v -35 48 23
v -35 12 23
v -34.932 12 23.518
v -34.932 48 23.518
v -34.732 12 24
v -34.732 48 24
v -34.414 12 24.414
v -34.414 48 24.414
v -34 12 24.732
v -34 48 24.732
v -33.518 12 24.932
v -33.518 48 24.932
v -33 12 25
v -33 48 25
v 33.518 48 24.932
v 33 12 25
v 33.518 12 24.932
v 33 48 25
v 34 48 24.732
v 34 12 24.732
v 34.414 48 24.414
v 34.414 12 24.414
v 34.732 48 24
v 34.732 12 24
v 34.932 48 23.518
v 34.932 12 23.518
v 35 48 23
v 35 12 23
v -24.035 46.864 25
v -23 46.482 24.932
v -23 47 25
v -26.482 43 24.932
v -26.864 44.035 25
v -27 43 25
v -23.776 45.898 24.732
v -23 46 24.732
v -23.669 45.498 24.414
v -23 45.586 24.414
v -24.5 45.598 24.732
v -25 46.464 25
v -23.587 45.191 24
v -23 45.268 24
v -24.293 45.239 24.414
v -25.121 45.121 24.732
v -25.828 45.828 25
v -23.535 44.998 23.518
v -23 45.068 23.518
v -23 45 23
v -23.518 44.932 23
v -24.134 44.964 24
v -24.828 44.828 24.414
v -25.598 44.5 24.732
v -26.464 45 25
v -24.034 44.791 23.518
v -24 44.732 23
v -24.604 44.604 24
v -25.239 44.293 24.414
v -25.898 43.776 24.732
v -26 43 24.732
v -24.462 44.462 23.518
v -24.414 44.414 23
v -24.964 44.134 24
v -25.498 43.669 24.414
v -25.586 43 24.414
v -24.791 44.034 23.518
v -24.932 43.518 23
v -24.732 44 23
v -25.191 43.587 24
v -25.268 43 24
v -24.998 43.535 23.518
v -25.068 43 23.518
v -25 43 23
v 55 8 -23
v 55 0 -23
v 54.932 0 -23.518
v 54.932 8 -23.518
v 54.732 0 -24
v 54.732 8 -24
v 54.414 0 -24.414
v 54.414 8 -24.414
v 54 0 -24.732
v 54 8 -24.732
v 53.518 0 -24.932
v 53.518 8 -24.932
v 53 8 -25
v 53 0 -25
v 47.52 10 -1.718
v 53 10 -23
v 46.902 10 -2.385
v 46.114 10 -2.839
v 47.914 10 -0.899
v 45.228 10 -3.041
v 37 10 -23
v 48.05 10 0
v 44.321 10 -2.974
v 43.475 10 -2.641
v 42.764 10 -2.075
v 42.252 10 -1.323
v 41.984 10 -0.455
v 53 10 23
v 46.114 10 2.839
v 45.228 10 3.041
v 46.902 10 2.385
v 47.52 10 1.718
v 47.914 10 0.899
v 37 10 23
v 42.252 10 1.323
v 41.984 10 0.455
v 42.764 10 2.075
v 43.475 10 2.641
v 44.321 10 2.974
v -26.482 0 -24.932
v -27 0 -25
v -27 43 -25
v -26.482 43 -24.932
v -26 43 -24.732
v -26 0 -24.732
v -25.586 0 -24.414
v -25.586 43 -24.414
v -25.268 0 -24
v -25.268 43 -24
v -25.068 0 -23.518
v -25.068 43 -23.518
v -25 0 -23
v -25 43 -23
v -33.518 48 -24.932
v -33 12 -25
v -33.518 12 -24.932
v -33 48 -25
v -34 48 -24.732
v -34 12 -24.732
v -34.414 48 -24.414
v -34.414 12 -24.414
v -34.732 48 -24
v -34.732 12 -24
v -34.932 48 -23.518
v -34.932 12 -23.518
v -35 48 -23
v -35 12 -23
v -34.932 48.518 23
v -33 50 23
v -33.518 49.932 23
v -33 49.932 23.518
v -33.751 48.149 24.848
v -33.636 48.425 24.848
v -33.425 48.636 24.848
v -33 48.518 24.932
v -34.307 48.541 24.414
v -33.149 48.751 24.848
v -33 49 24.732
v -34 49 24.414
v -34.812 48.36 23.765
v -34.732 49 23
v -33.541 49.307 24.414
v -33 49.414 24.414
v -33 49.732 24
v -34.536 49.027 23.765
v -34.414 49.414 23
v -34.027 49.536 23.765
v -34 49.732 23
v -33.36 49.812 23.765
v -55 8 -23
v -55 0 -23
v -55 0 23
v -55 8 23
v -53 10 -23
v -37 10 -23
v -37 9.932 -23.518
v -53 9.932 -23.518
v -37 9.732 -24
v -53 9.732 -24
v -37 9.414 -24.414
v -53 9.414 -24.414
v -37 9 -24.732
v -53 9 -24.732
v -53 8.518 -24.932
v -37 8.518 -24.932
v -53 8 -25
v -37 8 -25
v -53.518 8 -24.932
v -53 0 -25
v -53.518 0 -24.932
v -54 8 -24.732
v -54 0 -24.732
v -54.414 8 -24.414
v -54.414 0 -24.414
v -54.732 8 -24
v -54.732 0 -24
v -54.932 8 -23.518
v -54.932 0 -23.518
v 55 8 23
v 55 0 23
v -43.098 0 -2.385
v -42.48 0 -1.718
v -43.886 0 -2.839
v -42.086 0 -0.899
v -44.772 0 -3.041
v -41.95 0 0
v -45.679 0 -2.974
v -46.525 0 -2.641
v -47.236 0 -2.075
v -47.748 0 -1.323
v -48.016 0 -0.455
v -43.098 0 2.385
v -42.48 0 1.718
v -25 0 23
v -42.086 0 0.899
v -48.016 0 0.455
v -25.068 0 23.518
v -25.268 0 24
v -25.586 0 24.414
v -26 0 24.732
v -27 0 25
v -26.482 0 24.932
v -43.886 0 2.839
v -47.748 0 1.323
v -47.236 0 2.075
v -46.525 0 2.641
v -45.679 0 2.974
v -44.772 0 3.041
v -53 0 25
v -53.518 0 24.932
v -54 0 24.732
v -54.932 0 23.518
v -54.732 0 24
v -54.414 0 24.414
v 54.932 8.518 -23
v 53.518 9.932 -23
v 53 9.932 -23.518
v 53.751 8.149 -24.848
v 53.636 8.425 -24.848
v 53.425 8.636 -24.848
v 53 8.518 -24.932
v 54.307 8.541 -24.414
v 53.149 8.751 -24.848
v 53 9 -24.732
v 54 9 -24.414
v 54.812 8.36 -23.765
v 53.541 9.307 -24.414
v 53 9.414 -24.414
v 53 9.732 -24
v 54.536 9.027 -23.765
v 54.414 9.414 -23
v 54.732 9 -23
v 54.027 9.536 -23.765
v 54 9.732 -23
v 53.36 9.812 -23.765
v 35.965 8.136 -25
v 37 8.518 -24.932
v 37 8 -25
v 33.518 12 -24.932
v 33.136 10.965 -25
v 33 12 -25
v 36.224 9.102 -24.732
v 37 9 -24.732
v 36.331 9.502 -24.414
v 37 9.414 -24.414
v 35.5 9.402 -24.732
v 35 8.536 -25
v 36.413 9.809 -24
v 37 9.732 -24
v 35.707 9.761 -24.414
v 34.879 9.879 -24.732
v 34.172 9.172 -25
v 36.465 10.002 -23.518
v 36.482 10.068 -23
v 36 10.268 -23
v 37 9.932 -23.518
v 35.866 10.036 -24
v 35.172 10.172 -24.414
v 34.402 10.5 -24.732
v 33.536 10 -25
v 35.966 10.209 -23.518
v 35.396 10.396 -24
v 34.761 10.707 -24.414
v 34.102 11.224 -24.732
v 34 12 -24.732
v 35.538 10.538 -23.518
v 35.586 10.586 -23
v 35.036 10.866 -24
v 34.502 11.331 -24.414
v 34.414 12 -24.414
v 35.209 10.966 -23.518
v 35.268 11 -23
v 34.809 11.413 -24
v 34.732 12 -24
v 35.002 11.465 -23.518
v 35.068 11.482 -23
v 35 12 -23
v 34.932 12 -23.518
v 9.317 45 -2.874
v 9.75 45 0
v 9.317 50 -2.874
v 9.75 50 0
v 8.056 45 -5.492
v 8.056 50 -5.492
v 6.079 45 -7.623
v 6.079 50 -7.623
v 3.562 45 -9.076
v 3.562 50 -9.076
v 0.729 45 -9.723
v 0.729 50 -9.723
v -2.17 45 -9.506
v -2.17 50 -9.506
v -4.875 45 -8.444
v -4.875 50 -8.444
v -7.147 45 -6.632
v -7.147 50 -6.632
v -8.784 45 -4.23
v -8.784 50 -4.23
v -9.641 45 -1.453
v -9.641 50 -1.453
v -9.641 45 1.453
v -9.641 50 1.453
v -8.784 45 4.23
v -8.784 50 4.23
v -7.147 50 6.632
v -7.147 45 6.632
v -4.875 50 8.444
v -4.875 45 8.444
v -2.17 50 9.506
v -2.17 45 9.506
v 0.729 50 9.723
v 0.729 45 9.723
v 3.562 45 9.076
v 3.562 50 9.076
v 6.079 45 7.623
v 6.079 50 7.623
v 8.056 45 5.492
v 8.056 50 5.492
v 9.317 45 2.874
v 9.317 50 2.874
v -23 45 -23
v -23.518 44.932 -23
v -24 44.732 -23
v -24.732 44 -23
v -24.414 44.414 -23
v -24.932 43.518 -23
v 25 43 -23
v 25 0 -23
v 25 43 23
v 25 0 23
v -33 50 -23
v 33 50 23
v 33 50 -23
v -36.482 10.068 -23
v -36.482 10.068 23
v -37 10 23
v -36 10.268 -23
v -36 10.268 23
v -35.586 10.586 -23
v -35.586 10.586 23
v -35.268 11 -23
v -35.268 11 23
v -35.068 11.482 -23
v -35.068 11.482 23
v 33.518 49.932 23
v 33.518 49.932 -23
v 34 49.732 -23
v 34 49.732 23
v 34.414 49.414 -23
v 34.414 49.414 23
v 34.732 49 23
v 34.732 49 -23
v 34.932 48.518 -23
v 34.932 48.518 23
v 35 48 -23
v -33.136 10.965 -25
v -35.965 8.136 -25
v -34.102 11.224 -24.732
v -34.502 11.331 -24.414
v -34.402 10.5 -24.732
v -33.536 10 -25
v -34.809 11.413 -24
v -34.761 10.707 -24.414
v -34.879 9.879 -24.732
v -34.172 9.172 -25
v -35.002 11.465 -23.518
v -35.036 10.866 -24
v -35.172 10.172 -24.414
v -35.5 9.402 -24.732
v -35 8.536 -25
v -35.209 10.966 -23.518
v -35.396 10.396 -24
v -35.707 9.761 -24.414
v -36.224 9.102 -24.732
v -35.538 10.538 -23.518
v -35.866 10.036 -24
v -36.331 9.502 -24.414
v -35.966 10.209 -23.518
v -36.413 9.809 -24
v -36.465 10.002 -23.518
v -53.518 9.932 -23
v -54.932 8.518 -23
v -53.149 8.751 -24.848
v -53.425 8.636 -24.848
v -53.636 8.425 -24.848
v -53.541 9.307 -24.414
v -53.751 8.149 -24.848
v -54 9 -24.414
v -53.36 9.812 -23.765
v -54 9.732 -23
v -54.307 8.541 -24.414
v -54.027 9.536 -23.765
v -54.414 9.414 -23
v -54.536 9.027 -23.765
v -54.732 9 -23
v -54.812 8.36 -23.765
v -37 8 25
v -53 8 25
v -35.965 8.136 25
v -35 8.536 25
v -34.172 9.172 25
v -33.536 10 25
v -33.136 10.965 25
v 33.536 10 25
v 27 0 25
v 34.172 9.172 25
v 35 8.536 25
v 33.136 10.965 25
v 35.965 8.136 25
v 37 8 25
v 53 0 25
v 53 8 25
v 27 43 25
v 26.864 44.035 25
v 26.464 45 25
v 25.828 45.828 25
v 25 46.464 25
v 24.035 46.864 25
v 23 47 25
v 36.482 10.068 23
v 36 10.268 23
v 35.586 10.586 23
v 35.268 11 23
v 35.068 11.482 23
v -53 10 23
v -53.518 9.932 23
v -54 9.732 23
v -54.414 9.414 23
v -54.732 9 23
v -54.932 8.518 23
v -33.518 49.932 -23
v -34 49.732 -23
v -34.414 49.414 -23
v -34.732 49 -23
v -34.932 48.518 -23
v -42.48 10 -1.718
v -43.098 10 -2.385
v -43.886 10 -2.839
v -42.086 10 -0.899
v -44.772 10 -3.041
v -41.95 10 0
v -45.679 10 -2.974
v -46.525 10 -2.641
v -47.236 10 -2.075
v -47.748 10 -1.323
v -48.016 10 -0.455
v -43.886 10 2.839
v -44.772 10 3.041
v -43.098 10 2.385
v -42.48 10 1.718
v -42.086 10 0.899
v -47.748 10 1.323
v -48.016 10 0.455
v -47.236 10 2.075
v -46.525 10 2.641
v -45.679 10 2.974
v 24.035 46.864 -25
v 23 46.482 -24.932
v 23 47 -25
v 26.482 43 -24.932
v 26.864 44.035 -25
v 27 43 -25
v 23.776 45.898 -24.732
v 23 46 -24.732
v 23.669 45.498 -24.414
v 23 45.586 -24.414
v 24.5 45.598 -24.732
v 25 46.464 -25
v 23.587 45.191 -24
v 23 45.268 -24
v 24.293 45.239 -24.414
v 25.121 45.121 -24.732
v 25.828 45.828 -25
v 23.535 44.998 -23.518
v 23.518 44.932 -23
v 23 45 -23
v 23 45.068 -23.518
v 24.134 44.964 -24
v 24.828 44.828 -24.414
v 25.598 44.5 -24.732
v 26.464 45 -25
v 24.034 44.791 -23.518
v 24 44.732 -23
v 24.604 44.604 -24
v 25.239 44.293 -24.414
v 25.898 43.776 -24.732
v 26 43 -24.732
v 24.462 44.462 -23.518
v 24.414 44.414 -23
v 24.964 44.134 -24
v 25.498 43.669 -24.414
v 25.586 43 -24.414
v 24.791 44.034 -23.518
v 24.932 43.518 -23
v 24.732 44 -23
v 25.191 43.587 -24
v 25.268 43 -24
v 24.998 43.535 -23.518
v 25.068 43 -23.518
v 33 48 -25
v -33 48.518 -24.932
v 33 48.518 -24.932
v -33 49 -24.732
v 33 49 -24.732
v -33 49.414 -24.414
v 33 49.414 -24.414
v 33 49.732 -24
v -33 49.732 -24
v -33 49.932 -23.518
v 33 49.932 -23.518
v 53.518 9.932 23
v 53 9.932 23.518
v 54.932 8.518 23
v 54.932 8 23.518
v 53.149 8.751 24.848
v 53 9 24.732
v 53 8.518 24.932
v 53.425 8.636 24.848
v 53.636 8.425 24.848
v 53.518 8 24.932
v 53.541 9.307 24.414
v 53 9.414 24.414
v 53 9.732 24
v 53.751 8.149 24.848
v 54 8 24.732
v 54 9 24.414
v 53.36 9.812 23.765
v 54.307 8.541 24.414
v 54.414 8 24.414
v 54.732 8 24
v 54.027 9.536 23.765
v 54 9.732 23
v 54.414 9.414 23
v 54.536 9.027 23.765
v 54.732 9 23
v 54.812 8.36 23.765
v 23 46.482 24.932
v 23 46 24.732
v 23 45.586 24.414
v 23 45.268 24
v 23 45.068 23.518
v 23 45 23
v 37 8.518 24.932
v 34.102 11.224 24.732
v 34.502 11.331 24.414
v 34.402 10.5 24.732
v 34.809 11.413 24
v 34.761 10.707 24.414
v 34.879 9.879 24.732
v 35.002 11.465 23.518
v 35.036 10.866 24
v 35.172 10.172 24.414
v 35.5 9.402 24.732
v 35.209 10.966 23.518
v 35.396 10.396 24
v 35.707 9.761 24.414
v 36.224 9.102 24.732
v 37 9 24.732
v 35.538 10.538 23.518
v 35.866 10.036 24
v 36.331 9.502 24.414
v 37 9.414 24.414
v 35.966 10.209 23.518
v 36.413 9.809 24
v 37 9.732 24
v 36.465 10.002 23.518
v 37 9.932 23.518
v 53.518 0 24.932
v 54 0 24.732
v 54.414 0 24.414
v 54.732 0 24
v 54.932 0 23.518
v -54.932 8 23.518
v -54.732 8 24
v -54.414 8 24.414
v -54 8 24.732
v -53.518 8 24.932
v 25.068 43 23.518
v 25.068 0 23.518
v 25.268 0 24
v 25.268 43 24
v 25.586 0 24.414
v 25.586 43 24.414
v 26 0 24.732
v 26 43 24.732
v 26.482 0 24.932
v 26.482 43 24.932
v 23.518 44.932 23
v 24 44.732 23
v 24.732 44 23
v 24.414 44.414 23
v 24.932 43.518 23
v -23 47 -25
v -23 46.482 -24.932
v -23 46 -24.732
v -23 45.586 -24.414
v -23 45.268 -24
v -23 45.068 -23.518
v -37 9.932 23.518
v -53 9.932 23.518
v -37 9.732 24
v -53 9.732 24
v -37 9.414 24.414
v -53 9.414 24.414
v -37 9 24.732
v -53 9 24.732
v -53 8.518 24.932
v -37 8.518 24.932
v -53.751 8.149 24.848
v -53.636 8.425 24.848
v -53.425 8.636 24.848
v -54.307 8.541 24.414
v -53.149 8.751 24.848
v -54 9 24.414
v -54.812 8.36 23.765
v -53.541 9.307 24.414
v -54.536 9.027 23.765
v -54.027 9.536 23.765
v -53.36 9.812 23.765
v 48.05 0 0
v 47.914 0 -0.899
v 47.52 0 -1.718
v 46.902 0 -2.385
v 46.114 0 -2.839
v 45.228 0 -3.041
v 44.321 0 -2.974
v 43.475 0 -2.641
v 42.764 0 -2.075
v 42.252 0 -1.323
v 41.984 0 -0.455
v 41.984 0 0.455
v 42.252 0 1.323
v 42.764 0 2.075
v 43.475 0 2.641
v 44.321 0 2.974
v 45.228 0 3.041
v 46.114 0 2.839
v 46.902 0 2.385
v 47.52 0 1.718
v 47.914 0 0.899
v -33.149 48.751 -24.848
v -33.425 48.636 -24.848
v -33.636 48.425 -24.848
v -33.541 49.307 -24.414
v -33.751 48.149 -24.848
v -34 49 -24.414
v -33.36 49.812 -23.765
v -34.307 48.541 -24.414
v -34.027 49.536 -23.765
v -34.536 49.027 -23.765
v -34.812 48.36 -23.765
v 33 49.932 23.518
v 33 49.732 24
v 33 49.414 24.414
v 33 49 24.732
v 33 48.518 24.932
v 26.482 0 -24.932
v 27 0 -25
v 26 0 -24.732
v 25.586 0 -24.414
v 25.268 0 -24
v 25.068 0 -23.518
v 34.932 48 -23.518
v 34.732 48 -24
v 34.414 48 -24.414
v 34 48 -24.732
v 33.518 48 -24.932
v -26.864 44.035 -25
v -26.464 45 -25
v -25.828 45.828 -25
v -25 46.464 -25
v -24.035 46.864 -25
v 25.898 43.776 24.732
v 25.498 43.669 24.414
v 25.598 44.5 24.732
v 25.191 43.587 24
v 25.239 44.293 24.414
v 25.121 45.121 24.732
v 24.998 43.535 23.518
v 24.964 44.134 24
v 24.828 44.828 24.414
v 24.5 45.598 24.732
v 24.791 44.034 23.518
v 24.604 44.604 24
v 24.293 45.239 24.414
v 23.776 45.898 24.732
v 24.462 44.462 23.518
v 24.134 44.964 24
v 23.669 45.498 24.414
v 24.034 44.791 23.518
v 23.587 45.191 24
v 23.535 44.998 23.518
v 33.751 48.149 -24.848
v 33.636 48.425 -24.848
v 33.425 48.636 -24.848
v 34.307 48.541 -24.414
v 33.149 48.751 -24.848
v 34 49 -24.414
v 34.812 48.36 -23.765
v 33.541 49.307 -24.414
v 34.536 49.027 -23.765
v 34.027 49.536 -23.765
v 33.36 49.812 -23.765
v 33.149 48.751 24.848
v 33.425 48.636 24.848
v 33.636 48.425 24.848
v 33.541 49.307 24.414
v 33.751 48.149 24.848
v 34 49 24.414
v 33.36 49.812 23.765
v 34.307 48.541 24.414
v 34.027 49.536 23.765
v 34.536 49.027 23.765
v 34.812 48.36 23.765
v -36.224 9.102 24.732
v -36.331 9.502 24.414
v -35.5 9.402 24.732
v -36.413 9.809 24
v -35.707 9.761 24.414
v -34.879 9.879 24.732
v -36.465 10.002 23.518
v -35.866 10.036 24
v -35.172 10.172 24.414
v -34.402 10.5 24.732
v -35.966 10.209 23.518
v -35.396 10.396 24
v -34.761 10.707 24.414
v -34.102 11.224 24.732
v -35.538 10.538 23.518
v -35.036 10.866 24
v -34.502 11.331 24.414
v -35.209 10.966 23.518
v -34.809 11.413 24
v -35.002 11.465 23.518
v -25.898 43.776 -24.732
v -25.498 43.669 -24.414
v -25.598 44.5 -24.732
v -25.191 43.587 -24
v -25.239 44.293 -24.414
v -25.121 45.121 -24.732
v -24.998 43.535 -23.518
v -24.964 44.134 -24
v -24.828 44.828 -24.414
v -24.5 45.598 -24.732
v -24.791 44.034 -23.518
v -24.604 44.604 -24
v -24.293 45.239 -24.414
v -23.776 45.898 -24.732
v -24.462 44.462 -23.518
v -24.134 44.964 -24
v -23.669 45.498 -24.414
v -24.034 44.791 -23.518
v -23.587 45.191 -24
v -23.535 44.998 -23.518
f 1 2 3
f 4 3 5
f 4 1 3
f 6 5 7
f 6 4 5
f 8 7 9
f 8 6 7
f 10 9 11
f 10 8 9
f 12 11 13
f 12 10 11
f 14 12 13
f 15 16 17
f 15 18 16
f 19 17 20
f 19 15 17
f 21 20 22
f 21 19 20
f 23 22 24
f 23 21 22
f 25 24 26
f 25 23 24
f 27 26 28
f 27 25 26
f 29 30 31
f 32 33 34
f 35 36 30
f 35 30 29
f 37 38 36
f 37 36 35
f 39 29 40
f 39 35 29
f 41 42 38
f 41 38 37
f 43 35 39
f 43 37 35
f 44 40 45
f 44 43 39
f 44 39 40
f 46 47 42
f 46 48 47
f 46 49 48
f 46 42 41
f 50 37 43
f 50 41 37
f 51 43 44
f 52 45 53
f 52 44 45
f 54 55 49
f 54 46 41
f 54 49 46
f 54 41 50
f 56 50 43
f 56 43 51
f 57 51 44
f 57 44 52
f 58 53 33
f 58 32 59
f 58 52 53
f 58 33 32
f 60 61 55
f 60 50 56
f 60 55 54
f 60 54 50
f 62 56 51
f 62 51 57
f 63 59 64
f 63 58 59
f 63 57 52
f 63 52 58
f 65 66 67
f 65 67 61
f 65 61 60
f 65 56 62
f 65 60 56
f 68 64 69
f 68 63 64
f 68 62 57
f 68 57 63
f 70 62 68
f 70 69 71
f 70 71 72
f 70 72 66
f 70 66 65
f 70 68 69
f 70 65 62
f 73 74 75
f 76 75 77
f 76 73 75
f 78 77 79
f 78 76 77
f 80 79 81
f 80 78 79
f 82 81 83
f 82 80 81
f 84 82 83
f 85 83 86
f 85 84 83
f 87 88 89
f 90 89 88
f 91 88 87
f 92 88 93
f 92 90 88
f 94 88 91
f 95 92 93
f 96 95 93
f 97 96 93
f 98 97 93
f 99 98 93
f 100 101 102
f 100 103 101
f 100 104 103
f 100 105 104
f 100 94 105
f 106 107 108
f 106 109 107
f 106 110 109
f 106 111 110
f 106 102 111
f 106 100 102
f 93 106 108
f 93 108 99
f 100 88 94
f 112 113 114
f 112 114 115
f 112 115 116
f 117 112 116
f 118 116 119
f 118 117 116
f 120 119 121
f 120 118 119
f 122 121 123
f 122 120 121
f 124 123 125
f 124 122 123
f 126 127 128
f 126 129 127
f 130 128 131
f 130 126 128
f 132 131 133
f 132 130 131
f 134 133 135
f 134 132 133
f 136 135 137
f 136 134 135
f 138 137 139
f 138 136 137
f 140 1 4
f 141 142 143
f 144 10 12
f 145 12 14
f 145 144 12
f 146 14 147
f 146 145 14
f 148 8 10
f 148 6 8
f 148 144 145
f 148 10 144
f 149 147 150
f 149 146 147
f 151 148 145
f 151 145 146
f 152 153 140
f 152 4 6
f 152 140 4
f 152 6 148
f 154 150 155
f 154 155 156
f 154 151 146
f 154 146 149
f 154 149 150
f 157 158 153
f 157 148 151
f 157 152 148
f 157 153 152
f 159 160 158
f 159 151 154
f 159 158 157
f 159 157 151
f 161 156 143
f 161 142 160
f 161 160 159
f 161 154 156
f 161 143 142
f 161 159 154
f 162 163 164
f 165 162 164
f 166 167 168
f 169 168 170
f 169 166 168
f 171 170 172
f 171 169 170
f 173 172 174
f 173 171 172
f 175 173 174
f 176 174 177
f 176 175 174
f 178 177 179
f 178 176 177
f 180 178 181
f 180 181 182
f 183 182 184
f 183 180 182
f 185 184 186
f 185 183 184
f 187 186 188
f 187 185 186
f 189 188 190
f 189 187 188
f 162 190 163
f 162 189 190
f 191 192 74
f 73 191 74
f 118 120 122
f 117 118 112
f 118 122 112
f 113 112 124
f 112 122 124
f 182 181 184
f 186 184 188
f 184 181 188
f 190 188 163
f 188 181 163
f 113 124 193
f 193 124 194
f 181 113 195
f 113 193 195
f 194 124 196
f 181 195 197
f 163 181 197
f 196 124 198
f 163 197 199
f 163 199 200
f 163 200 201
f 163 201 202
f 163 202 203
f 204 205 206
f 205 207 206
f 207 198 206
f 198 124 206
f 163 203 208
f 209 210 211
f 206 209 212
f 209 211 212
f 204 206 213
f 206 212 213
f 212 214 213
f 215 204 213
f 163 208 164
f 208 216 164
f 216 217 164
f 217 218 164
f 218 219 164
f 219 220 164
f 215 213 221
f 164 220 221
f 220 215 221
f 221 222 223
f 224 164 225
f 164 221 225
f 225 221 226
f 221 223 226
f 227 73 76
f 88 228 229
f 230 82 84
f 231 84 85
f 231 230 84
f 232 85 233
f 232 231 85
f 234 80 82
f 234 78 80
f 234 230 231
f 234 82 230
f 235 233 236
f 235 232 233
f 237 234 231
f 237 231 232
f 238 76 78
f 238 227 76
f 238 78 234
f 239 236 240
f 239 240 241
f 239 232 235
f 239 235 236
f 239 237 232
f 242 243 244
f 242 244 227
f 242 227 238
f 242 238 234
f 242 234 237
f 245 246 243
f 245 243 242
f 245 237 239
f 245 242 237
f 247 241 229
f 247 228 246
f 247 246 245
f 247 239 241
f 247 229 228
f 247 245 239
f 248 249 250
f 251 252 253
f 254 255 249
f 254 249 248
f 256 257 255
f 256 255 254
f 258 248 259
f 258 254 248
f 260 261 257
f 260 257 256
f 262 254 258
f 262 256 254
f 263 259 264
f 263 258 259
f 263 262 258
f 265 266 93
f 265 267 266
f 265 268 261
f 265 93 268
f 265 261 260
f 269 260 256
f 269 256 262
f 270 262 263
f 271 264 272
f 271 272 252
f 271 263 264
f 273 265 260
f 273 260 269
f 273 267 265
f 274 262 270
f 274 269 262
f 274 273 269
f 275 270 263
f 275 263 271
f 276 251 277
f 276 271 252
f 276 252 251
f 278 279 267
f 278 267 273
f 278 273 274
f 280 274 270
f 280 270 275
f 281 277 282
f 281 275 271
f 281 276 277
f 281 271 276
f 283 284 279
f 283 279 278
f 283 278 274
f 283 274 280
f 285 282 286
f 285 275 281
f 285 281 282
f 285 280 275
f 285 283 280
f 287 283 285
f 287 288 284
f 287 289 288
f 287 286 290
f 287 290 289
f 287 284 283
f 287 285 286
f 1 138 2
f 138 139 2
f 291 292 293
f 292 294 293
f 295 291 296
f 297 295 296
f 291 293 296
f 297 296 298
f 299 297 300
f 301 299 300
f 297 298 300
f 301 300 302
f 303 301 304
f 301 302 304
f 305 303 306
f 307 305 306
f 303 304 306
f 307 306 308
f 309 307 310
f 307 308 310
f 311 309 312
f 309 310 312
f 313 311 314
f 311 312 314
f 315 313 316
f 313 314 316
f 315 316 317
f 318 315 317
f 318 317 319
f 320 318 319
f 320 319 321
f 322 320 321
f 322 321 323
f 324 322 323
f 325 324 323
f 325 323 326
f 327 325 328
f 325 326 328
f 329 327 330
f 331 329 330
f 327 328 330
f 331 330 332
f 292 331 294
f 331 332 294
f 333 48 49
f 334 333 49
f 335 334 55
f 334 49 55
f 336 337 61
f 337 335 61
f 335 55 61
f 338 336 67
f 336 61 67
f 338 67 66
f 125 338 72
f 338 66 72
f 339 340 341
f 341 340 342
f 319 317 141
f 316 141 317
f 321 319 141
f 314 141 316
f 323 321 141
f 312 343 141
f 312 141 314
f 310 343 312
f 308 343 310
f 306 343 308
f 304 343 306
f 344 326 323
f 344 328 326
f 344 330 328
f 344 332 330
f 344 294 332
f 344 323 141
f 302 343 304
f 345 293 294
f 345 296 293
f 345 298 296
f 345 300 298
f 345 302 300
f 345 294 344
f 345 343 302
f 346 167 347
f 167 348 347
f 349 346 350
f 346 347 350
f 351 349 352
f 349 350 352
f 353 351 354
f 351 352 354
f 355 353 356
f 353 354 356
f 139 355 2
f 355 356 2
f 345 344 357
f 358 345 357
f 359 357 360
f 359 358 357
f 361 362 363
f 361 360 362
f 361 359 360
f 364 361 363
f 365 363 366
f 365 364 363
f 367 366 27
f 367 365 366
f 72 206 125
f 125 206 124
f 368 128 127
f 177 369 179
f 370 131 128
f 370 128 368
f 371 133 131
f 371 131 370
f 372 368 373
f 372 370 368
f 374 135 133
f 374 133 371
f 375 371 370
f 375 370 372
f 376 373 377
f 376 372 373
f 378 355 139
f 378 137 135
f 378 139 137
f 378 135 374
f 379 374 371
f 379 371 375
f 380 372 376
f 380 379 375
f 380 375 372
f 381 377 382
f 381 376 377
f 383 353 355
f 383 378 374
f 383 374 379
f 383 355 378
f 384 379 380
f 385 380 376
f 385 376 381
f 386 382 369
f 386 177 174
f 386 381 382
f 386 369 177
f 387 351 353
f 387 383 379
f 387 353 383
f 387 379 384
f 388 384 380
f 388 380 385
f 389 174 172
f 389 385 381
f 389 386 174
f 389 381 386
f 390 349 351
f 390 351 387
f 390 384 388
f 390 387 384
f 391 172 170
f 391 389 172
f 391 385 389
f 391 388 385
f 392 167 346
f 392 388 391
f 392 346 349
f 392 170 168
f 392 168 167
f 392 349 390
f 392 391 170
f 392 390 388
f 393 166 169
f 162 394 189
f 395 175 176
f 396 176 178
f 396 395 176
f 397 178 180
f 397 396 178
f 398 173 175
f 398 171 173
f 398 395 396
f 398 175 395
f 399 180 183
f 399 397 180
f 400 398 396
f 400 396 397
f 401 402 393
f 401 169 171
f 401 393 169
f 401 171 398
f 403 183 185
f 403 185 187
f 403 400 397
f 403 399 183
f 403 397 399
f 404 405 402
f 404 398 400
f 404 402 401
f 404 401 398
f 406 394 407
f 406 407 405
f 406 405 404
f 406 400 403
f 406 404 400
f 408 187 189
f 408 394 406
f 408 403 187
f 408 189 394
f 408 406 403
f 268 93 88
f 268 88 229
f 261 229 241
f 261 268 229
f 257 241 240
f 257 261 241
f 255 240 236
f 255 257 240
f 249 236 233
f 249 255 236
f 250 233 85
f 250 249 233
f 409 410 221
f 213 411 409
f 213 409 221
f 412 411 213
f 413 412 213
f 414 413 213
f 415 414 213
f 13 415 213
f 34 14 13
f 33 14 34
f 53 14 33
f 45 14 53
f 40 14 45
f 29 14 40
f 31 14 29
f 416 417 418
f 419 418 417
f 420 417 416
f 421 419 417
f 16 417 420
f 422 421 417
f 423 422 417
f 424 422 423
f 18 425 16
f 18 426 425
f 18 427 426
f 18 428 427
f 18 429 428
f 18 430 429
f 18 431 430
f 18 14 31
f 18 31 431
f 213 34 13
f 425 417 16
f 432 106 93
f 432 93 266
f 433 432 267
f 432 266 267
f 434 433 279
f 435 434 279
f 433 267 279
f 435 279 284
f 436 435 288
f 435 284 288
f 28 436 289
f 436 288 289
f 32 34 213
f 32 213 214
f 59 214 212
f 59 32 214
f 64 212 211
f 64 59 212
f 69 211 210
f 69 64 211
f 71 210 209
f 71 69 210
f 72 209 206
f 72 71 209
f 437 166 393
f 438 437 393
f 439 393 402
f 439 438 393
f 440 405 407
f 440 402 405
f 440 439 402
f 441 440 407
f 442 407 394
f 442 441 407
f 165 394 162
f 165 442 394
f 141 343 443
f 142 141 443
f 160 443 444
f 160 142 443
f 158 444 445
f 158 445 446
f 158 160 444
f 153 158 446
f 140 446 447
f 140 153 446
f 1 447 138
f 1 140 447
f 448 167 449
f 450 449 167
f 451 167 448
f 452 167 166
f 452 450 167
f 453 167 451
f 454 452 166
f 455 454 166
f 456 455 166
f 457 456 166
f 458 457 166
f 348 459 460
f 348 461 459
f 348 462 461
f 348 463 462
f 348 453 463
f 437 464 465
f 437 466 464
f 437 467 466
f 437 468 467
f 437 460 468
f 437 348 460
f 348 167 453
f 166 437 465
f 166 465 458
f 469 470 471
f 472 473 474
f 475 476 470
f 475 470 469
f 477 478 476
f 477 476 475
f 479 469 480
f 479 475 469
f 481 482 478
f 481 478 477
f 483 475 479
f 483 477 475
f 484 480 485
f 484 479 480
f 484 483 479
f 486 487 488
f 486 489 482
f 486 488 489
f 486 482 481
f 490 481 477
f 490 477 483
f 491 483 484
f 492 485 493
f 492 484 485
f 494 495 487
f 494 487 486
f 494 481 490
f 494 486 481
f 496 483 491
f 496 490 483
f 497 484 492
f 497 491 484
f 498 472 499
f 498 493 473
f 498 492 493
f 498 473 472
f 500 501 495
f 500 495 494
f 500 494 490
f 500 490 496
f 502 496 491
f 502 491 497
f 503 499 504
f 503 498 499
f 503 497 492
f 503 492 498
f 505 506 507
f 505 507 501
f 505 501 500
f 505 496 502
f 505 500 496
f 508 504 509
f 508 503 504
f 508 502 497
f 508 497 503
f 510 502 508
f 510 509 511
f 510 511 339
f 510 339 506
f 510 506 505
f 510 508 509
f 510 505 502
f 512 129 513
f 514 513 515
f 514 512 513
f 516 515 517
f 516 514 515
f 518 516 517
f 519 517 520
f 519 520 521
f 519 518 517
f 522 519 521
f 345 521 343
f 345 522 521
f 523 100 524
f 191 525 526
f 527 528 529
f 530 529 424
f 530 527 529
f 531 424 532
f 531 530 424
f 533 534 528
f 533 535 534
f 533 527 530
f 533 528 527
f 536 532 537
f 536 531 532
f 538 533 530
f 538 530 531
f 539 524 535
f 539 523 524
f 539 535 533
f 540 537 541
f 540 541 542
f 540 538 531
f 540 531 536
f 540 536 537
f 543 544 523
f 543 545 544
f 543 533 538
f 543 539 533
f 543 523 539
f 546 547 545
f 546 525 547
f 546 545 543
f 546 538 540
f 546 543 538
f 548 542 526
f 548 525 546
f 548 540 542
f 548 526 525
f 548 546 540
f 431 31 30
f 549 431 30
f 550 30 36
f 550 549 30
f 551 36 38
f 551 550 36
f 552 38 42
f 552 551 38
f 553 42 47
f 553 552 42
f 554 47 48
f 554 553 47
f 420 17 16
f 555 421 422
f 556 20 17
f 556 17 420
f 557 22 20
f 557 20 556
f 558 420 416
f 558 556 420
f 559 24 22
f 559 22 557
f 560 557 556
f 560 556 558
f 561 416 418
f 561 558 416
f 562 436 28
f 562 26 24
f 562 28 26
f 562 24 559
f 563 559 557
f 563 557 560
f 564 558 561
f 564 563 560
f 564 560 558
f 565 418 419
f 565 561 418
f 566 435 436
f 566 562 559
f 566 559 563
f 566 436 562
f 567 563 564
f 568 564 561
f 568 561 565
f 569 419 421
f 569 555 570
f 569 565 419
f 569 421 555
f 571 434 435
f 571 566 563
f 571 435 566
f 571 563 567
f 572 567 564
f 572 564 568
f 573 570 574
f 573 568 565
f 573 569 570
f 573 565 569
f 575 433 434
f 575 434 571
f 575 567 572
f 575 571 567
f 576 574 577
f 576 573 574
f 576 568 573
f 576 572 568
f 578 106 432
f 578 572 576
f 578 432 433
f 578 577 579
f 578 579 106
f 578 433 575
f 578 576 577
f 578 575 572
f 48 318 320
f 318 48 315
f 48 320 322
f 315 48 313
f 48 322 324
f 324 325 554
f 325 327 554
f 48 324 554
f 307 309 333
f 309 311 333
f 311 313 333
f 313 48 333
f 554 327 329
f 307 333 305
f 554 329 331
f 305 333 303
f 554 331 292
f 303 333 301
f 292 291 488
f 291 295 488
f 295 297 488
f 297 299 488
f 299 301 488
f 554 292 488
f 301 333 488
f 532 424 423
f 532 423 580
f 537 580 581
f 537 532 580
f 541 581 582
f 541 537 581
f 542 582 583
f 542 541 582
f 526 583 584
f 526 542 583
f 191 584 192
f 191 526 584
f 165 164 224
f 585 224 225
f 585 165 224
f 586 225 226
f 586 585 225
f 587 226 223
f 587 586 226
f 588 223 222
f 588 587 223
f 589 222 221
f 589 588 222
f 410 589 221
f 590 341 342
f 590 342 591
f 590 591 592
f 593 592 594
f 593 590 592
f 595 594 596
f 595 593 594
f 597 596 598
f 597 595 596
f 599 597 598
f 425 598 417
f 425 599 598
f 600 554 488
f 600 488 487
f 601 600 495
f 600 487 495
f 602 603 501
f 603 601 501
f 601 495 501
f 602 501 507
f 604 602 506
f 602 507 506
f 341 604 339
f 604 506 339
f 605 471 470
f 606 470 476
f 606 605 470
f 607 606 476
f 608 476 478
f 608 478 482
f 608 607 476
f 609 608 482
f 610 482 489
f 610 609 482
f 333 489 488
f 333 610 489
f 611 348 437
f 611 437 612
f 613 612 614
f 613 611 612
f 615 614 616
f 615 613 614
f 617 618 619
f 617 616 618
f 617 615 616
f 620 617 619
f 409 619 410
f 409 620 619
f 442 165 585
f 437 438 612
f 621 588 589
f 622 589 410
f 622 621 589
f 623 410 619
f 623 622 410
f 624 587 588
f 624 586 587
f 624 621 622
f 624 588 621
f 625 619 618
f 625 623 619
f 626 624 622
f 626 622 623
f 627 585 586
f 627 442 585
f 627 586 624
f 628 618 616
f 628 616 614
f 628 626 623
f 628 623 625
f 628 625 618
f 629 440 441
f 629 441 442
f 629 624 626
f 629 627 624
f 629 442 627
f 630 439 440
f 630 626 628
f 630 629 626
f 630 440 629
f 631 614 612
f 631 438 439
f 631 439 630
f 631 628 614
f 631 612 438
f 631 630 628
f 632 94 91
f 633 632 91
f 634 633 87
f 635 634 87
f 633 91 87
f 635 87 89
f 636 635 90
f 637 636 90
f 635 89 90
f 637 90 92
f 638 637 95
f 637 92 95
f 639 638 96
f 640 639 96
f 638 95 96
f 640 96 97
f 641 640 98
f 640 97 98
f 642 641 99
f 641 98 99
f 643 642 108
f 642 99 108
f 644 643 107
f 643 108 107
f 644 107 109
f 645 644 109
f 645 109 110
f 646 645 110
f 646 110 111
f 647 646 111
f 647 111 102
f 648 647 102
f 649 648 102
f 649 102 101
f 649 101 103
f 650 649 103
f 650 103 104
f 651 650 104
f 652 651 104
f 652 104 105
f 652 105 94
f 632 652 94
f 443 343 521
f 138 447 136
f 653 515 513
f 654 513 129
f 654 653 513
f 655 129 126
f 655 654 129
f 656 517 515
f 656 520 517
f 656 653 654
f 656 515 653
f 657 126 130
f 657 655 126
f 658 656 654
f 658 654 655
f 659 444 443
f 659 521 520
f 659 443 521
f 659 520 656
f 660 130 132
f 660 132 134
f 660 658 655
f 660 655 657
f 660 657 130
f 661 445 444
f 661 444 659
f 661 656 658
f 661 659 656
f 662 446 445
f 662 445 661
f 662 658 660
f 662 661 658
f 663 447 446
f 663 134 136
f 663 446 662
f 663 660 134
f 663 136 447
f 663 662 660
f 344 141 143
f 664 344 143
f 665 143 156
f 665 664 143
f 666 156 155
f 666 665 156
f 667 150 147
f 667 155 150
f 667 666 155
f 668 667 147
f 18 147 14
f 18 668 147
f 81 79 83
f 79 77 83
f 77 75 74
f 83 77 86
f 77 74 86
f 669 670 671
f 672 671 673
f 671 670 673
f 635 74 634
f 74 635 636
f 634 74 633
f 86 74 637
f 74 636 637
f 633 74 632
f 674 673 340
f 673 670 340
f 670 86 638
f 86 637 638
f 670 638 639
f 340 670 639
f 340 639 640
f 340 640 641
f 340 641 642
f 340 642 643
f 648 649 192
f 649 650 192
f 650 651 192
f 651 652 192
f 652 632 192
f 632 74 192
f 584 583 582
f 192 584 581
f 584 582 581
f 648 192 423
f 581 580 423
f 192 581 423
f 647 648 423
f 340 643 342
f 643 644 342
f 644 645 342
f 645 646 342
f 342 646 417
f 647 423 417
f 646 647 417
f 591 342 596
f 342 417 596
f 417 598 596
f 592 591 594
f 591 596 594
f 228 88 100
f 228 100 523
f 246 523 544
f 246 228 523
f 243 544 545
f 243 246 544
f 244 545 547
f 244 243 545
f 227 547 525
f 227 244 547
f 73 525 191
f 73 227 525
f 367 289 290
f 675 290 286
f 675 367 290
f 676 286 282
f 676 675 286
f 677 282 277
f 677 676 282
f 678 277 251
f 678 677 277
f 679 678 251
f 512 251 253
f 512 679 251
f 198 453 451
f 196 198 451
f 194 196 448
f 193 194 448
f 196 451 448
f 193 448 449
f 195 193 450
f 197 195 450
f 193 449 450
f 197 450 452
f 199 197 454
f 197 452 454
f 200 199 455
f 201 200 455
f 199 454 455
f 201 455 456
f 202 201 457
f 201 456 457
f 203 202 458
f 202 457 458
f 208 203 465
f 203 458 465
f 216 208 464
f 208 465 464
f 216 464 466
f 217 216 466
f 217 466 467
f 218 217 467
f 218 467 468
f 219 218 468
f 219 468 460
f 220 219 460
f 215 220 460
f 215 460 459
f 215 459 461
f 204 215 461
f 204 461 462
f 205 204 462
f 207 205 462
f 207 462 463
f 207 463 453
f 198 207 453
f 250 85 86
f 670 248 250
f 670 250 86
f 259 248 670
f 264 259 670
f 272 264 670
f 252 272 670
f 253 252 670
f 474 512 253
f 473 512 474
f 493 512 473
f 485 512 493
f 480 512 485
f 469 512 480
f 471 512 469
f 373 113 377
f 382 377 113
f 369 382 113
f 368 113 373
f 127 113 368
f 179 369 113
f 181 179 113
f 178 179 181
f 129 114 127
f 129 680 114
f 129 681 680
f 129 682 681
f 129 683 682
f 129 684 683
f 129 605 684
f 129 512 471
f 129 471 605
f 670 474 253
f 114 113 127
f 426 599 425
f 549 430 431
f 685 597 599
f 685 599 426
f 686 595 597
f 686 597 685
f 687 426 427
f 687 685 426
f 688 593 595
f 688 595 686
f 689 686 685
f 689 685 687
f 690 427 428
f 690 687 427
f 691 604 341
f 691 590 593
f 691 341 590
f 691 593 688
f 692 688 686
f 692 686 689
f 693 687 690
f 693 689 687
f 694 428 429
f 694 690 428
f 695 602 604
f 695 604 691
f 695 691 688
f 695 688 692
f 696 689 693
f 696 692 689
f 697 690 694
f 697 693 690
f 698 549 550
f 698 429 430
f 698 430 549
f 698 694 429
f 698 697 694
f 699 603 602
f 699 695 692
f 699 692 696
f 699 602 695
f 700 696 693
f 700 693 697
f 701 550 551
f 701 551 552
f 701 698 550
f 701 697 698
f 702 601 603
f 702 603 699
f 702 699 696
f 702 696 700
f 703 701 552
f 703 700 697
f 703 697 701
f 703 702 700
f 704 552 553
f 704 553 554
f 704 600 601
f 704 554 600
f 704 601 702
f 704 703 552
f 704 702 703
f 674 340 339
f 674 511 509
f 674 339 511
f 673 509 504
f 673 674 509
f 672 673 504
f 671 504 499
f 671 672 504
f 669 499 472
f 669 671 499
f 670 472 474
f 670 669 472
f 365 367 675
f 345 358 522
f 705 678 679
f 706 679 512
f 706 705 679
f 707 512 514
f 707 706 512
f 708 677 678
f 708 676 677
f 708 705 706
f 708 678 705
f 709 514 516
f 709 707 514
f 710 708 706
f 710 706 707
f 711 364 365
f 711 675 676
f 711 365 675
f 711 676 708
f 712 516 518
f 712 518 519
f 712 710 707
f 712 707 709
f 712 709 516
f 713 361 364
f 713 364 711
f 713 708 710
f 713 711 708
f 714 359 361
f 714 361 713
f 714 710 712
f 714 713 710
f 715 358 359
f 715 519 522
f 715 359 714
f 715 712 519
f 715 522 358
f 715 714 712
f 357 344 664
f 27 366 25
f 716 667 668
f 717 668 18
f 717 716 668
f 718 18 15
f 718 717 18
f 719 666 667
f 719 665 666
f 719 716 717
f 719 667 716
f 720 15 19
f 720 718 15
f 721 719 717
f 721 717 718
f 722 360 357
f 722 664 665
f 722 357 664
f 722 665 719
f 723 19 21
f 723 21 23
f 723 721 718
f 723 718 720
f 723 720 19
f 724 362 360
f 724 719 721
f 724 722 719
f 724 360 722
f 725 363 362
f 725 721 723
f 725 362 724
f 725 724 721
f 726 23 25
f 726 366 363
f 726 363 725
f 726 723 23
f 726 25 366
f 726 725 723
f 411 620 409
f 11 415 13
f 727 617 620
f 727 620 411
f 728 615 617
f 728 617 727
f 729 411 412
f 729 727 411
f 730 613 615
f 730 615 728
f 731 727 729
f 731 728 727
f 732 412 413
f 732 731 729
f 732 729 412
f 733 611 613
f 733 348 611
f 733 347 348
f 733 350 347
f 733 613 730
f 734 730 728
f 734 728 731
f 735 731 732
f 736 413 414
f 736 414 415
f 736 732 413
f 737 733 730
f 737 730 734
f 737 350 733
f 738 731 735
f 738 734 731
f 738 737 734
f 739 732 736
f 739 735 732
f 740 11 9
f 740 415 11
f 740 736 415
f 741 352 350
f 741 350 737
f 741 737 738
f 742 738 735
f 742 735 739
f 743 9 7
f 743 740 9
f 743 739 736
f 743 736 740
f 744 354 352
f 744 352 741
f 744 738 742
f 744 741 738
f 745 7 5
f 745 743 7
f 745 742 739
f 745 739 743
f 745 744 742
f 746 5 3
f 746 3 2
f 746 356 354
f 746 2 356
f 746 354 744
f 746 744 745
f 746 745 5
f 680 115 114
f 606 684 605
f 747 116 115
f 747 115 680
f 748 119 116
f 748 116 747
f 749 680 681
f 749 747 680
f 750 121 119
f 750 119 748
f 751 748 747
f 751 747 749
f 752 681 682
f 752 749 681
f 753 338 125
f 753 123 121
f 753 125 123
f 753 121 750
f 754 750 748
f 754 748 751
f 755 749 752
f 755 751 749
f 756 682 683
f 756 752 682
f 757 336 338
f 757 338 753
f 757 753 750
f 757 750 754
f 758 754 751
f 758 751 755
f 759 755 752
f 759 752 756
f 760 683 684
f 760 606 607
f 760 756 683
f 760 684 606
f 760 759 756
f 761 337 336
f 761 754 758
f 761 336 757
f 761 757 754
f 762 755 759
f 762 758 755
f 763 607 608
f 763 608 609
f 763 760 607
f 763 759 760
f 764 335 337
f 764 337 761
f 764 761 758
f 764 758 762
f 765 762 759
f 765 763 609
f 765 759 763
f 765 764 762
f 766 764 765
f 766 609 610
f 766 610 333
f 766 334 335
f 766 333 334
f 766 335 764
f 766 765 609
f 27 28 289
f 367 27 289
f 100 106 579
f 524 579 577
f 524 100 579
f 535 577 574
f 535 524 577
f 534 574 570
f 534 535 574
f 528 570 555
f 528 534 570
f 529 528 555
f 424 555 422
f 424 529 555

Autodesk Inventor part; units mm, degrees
ref_plane "YZ Plane" through (0, 0, 0) normal (1, 0, 0) x (0, 1, 0)
ref_plane "XZ Plane" through (0, 0, 0) normal (0, 1, 0) x (-1, 0, 0)
ref_plane "XY Plane" through (0, 0, 0) normal (0, 0, 1) x (1, 0, 0)
sketch "Sketch1" plane through (0, 0, 0) normal (0, 1, 0) x (-1, 0, 0)
  line L0 (55, 25) -> (-55, 25)
  line L1 (-55, 25) -> (-55, -25)
  line L2 (-55, -25) -> (55, -25)
  line L3 (55, -25) -> (55, 25)
  line L4 (55, 25) -> (-55, -25) construction
  line L5 (-55, 25) -> (55, -25) construction
  line L6 (-25, 25) -> (25, 25)
  line L7 (25, 25) -> (25, -25)
  line L8 (25, -25) -> (-25, -25)
  line L9 (-25, -25) -> (-25, 25)
  line L10 (-25, 25) -> (25, -25) construction
  line L11 (25, 25) -> (-25, -25) construction
  point P0 (0, 0)
  dimension "d0" = 110
  dimension "d1" = 50
  dimension "d2" = 50
  dimension "d3" = 50
extrude "Extrusion1" add sketch "Sketch1" along normal blind 10 contours L3 L2 L7 L0 | L9 L2 L1 L0
sketch "Sketch2" plane through (0, 10, 0) normal (0, 1, 0) x (1, 0, 0)
  line L0 (-35, -25) -> (-25, -25)
  line L1 (-25, -25) -> (-25, 25)
  line L2 (-25, 25) -> (-35, 25)
  line L3 (-35, 25) -> (-35, -25)
  line L4 (-35, -25) -> (-25, 25) construction
  line L5 (-25, -25) -> (-35, 25) construction
  line L6 (25, -25) -> (35, -25)
  line L7 (35, -25) -> (35, 25)
  line L8 (35, 25) -> (25, 25)
  line L9 (25, 25) -> (25, -25)
  line L10 (25, -25) -> (35, 25) construction
  line L11 (35, -25) -> (25, 25) construction
  line L12 (-25, -25) -> (-25, 25) projected
  line L13 (25, 25) -> (25, -25) projected
  point P0 (0, 0)
  point P1 (-30, 0)
  point P2 (30, 0)
  dimension "d6" = 10
  dimension "d7" = 50
  dimension "d8" = 10
  dimension "d9" = 50
extrude "Extrusion2" add sketch "Sketch2" along normal blind 40
sketch "Sketch3" plane through (0, 50, 0) normal (0, 1, 0) x (1, 0, 0)
  line L0 (-25, -25) -> (25, -25)
  line L1 (25, -25) -> (25, 25)
  line L2 (25, 25) -> (-25, 25)
  line L3 (-25, 25) -> (-25, -25)
  line L4 (-25, -25) -> (25, 25) construction
  line L5 (25, -25) -> (-25, 25) construction
  line L6 (25, 25) -> (25, -25) projected
  line L7 (35, 25) -> (25, 25) projected
  point P0 (0, 0)
extrude "Extrusion3" add sketch "Sketch3" against normal blind 5
sketch "Sketch4" plane through (0, 50, 0) normal (0, 1, 0) x (1, 0, 0)
  circle A0 centre (0, 0) radius 9.75
  dimension "d14" = 19.5
extrude "Extrusion4" cut sketch "Sketch4" against normal blind 5
sketch "Sketch5" plane through (0, 10, 0) normal (0, 1, 0) x (1, 0, 0)
  circle A0 centre (-45, 0) radius 3.05
  circle A1 centre (45, 0) radius 3.05
  line L0 (55, -25) -> (55, 25) projected
  line L1 (-55, 25) -> (-55, -25) projected
  point P0 (0, 0)
  dimension "d17" = 6.1
  dimension "d18" = 6.1
  dimension "d22" = 10
  dimension "d23" = 10
extrude "Extrusion5" cut sketch "Sketch5" against normal through all
fillet "Fillet1" radius 2 28 edges at (-55, 10, 0) (-35, 10, 0) (-35, 50, 0) (35, 50, 0) (35, 10, 0) (55, 10, 0) (45, 10, 25) (45, 10, -25) (55, 5, 25) (55, 5, -25) (-45, 10, 25) (-55, 5, 25) (-55, 5, -25) (-45, 10, -25) (35, 30, 25) (35, 30, -25) (0, 50, -25) (0, 50, 25) (-35, 30, 25) (-35, 30, -25) (-25, 22.5, -25) (-25, 22.5, 25) (25, 22.5, -25) (25, 22.5, 25) (0, 45, 25) (0, 45, -25) (-25, 45, 0) (25, 45, 0)
